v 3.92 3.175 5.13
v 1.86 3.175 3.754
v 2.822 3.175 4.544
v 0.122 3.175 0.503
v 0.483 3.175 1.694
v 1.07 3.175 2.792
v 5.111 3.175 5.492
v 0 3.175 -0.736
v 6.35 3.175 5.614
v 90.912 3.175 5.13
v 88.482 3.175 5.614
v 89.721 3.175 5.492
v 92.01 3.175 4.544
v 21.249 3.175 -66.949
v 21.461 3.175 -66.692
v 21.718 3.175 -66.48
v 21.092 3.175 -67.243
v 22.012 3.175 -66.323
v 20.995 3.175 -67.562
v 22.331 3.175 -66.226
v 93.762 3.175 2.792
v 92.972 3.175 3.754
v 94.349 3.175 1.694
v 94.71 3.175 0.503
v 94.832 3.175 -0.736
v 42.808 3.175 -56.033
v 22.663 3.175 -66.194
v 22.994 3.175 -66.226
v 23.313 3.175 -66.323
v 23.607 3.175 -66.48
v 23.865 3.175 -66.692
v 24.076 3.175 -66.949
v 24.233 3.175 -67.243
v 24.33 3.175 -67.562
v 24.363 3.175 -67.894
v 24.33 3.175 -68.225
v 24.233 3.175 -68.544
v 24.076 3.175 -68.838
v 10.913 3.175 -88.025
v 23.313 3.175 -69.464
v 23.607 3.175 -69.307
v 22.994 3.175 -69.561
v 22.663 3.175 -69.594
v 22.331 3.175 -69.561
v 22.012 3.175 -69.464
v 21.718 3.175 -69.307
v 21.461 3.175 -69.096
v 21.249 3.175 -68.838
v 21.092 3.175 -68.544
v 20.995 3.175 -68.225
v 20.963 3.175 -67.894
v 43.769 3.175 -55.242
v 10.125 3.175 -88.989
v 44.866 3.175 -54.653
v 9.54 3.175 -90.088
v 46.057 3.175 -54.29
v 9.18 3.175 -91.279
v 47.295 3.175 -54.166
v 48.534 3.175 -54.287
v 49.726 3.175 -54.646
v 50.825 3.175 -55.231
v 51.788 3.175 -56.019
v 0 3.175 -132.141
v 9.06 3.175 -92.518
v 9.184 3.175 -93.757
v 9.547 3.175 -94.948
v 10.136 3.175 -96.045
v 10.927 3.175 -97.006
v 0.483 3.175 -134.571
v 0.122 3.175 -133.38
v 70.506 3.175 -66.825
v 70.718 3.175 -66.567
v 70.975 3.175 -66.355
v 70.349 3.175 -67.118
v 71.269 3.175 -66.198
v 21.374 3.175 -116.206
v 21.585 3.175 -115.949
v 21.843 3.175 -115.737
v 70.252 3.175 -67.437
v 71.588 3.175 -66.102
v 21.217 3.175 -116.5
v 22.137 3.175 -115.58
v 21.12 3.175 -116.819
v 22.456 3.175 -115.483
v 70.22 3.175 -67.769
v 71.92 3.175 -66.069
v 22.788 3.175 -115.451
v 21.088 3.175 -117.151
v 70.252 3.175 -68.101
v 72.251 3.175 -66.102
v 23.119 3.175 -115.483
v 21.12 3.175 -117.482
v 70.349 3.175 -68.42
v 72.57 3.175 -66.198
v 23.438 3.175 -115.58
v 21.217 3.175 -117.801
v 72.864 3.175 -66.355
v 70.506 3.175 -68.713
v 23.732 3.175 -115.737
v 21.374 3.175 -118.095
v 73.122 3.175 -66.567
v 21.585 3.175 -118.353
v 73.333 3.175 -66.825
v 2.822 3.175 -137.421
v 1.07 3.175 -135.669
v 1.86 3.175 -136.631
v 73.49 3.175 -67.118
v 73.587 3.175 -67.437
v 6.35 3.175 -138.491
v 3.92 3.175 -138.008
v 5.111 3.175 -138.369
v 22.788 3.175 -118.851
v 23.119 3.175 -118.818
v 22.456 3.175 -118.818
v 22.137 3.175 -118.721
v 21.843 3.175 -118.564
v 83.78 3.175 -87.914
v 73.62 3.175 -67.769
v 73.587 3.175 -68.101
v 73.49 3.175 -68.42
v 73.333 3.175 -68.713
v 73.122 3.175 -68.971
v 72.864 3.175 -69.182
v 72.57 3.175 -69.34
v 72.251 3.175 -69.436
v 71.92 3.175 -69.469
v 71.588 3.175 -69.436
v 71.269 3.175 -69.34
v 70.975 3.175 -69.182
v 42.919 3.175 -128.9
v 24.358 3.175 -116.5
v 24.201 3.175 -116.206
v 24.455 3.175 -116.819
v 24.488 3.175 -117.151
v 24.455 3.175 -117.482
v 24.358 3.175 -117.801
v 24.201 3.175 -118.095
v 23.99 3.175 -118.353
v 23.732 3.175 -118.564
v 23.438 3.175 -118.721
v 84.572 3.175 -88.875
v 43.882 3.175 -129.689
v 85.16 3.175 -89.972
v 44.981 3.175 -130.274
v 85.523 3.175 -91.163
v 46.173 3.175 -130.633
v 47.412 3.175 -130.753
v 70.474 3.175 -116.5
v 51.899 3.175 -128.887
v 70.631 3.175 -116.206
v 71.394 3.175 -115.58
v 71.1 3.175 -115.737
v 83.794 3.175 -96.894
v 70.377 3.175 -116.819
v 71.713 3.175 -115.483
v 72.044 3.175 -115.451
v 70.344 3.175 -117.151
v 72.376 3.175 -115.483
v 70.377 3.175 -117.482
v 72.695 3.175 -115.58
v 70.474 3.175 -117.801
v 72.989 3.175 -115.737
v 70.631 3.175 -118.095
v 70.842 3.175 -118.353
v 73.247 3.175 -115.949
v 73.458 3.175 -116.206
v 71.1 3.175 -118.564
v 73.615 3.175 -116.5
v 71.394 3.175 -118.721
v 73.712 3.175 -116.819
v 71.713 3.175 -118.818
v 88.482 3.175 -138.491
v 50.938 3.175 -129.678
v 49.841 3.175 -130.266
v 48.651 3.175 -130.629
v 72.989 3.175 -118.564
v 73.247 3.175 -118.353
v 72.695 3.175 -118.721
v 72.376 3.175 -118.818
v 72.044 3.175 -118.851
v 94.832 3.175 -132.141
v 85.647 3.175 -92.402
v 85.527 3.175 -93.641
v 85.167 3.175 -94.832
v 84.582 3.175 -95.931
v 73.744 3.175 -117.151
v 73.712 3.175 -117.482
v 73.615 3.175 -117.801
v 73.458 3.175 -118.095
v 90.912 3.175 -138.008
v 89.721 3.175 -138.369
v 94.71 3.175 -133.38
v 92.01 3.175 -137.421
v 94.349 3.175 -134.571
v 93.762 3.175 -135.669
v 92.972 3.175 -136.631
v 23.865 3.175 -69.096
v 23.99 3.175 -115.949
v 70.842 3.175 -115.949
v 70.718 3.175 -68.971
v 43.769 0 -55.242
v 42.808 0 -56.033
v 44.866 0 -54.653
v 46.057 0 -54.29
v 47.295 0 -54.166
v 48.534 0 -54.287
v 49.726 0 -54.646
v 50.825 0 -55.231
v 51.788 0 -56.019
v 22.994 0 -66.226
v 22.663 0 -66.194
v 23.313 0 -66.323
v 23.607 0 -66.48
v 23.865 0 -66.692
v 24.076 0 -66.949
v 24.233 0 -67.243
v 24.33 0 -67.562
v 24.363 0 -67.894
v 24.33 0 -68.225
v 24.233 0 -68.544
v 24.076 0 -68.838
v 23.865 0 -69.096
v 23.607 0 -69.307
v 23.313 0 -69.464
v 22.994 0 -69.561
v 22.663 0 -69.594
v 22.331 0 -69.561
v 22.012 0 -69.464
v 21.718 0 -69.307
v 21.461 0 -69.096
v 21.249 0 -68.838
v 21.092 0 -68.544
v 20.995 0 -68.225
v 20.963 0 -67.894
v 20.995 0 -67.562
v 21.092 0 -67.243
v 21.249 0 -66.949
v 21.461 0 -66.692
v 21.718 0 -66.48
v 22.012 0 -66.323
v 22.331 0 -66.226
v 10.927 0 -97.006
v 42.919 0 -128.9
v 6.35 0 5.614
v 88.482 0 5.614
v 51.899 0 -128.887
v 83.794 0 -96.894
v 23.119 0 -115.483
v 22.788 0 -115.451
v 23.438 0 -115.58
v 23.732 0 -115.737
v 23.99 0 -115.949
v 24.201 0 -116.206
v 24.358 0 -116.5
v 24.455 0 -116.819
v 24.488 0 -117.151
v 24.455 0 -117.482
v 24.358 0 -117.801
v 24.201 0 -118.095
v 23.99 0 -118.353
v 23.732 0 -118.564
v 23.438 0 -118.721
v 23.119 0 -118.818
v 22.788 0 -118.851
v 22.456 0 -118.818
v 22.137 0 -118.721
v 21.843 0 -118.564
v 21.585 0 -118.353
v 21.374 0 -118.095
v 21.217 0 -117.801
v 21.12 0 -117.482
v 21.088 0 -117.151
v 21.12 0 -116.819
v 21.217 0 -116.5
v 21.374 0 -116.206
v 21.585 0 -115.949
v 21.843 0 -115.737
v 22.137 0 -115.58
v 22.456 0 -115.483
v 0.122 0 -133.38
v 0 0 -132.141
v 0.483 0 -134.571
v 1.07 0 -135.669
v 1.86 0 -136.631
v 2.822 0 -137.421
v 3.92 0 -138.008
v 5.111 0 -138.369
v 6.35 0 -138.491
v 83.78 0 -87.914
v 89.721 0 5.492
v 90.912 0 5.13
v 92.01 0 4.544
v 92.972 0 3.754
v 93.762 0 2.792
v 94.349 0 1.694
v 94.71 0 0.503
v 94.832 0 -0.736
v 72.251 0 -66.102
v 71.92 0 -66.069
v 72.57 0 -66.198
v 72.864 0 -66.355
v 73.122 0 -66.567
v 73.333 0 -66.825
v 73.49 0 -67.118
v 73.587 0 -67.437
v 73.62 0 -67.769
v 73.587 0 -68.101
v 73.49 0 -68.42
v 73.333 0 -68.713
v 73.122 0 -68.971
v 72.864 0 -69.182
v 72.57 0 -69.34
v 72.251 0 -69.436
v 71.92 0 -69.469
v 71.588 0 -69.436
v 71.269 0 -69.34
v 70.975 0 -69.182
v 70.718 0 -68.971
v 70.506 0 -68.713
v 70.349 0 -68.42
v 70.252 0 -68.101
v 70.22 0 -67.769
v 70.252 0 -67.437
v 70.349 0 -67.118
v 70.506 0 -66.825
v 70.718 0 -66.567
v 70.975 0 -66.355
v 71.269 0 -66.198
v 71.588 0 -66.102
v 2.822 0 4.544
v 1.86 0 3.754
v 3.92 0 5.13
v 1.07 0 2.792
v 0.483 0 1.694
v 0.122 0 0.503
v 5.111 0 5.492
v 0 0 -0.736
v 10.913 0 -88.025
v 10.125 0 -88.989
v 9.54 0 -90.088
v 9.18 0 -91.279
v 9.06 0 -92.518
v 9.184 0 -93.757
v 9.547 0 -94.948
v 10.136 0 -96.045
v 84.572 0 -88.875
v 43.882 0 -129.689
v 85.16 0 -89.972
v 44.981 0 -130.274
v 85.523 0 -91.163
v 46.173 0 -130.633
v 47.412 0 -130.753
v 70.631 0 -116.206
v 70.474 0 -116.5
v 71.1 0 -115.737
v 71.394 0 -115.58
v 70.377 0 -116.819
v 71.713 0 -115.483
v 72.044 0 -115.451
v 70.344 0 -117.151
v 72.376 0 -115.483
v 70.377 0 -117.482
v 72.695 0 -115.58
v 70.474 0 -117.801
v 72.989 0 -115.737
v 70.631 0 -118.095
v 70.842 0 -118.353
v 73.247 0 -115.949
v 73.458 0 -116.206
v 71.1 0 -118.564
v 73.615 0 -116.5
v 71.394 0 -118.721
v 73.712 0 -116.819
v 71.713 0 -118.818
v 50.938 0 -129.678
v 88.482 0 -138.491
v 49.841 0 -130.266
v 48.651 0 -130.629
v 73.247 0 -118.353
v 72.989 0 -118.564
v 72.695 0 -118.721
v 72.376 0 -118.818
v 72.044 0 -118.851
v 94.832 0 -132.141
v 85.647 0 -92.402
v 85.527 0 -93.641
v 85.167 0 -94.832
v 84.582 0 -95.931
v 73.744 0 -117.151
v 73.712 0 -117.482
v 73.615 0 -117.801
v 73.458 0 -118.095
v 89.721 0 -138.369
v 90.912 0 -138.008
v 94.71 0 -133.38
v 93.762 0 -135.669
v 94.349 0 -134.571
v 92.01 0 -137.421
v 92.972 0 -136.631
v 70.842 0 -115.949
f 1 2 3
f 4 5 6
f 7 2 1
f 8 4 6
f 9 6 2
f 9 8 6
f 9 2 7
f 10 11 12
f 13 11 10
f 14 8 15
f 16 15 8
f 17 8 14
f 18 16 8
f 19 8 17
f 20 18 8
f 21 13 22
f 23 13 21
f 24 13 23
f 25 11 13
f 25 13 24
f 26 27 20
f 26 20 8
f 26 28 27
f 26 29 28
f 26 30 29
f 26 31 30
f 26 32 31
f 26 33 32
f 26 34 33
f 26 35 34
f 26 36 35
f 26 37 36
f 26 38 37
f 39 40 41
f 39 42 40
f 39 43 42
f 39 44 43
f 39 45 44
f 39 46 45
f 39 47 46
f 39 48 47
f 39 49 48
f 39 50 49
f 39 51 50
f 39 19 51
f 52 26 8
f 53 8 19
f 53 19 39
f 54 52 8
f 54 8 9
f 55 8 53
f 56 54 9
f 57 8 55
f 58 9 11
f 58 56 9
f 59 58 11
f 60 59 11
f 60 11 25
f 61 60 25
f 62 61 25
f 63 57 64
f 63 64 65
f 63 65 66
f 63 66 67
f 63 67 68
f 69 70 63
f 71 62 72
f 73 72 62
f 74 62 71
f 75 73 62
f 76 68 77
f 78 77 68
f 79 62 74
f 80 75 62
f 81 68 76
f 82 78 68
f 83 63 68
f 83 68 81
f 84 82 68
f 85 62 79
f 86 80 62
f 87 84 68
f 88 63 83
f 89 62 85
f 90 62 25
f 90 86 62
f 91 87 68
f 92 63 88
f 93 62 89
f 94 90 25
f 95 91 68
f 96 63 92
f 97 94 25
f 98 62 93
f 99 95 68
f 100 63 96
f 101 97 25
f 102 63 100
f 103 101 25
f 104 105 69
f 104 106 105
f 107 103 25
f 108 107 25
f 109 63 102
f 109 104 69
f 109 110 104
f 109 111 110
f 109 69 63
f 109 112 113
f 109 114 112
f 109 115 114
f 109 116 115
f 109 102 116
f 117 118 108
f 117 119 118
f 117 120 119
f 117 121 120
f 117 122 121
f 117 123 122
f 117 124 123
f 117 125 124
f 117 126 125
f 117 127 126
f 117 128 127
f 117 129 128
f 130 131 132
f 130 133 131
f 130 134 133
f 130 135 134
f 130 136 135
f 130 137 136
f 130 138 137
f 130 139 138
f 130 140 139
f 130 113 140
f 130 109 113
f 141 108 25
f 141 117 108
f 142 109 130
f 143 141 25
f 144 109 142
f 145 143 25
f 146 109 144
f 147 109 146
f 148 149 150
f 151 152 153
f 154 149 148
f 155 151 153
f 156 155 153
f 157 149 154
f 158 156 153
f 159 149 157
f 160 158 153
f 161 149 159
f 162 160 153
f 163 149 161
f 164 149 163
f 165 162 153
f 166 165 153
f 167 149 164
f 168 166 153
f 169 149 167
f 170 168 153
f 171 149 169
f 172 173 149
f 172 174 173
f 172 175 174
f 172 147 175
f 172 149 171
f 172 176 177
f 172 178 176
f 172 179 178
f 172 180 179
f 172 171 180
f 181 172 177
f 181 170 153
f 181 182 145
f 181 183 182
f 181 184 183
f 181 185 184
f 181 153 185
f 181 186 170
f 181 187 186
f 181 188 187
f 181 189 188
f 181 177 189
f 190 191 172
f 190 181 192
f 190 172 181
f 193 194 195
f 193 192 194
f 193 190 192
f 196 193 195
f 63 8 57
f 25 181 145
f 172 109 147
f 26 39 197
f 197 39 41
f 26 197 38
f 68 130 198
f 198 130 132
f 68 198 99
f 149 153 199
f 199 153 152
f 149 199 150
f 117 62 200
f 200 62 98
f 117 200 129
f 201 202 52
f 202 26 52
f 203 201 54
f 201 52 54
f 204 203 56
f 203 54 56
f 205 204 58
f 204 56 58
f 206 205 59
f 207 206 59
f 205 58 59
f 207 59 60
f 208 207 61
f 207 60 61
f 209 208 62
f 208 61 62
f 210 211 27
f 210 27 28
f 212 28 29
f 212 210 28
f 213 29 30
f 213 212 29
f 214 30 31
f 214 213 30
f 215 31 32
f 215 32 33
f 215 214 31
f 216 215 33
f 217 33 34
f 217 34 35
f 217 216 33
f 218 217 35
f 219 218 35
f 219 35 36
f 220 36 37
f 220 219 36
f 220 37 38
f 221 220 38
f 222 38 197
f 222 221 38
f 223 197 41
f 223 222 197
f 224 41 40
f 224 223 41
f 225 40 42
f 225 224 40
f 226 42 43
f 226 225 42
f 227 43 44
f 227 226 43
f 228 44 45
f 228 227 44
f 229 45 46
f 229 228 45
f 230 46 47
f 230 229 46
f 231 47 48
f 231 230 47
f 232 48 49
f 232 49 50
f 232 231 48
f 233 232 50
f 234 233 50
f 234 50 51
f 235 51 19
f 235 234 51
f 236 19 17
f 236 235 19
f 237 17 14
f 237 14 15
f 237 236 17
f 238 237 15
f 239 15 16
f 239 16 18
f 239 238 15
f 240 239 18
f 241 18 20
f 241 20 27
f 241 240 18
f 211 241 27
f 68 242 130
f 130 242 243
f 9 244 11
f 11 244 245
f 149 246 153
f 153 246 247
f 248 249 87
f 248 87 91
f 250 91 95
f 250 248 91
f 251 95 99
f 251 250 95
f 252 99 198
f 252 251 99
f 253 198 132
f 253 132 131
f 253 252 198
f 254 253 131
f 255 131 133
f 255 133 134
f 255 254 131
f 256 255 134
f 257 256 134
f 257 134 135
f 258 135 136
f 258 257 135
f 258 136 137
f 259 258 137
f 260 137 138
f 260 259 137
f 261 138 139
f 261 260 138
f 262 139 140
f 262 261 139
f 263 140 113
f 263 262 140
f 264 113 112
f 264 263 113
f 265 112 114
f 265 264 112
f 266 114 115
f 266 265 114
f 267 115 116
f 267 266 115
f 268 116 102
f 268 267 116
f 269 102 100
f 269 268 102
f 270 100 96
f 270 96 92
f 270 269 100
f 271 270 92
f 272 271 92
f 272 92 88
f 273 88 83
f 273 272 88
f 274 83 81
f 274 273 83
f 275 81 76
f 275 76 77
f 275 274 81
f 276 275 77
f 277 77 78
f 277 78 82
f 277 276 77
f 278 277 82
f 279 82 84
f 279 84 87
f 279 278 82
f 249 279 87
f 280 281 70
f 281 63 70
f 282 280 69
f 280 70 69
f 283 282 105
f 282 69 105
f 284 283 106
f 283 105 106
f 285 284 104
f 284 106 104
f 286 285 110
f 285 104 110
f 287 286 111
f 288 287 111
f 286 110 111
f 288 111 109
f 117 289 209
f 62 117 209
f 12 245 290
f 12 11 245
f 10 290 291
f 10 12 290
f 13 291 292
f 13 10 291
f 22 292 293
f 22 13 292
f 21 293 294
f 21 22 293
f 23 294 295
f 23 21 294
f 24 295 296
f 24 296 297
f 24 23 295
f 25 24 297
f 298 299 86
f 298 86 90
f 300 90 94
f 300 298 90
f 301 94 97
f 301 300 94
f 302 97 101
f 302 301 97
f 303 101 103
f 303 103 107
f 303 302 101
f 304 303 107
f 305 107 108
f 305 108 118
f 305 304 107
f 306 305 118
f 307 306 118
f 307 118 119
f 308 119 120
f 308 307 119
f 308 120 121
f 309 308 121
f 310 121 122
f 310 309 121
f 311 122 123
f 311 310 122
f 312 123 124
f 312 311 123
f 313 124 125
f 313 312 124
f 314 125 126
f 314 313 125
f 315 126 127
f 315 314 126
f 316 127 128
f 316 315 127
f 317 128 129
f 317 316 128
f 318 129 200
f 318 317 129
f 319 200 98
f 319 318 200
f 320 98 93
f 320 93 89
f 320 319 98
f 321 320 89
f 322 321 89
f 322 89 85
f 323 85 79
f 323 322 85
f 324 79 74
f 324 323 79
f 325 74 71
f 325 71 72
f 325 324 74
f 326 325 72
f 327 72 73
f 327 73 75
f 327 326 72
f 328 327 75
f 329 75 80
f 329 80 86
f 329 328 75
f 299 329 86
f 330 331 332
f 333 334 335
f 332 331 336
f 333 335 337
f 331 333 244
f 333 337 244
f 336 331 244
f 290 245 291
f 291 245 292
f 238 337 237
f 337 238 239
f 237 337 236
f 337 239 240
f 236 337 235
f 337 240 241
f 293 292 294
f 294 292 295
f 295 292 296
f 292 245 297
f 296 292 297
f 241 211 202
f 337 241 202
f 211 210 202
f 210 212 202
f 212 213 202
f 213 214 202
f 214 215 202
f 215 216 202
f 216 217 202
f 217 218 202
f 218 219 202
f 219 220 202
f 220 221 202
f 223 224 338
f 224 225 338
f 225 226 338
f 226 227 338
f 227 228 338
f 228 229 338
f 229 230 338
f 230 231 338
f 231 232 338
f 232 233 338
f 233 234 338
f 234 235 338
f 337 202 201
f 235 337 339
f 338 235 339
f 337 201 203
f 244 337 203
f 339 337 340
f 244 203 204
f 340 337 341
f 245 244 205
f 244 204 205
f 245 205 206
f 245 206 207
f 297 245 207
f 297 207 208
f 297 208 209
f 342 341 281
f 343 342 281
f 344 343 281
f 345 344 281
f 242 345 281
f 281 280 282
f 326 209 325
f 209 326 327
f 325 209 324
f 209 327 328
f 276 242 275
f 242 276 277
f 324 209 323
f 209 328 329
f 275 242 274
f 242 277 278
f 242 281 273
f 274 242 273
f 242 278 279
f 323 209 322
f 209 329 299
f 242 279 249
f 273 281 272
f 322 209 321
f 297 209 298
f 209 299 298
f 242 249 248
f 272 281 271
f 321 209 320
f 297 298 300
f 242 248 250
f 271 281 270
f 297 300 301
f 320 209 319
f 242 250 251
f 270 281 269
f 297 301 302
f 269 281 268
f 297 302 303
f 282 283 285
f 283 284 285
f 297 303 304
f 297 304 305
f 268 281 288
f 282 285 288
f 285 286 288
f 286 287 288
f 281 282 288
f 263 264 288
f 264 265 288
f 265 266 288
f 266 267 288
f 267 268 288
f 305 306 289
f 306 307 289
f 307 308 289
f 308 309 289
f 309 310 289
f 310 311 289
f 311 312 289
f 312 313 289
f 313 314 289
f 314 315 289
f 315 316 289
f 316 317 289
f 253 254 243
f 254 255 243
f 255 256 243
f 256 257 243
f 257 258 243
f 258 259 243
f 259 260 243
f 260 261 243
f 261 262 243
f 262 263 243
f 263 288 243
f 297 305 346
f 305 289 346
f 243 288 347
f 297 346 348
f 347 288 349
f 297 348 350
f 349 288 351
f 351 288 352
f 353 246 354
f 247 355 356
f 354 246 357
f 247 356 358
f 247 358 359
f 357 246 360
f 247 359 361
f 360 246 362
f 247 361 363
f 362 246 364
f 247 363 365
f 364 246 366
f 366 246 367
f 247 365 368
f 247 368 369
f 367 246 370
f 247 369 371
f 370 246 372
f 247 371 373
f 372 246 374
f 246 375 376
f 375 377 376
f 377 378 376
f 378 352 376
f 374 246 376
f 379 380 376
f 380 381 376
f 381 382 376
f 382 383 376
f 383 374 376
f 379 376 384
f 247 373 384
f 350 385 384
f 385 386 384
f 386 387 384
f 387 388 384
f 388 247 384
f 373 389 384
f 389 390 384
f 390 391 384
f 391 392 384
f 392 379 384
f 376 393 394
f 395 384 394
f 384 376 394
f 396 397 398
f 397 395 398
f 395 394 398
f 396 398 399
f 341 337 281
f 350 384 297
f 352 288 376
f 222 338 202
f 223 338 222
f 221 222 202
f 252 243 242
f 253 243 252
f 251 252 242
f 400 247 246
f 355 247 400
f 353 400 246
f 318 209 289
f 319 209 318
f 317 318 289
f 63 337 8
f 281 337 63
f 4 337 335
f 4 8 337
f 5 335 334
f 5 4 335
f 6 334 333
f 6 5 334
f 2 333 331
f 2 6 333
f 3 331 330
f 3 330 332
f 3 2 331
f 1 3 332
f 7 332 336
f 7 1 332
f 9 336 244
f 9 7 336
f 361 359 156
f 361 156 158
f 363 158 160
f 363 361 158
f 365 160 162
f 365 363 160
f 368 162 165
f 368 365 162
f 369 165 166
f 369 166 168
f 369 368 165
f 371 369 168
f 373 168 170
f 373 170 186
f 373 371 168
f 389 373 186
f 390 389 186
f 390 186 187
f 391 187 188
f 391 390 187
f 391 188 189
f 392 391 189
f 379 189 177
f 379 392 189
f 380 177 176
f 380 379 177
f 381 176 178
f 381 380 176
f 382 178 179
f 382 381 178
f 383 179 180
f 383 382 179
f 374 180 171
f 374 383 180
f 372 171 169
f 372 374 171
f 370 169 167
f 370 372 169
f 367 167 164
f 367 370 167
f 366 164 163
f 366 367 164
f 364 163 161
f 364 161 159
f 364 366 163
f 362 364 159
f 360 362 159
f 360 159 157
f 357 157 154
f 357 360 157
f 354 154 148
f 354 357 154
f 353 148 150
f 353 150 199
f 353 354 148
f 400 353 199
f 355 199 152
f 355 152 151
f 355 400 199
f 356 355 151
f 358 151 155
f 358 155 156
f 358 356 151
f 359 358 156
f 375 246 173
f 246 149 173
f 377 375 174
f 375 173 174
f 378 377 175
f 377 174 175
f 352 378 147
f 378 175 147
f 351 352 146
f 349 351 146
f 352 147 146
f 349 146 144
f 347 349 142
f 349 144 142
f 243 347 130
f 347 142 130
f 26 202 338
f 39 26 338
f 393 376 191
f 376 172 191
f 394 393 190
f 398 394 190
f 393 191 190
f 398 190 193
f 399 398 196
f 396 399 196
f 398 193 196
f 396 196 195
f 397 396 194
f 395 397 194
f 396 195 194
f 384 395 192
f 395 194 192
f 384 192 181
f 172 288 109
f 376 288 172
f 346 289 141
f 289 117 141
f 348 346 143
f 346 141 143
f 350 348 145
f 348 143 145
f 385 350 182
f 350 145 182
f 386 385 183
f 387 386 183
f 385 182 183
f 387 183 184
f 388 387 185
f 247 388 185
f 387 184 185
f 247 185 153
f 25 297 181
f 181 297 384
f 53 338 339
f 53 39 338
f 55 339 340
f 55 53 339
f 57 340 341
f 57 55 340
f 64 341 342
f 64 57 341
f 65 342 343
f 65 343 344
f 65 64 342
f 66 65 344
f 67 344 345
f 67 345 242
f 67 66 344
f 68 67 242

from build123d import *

# Parameters (mm, degrees)
SKETCH1_W           = 94.832
SKETCH1_H           = 144.105
SKETCH1_R           = 1.7
BOSS_EXTRUDE2_DEPTH = 3.175
FILLET1_R           = 6.35
FILLET2_R           = 6.35


with BuildPart() as part:
    # Sketch1 → Boss-Extrude2 (new body)
    with BuildSketch(Plane(origin=(0, 0, 0), x_dir=(1, 0, 0), z_dir=(0, 1, 0))):
        with Locations((47.416, 66.438639868)):
            Rectangle(SKETCH1_W, SKETCH1_H)
        with Locations(Location((22.7875, 117.150797893, 0), (0, 0, 270))):
            Circle(SKETCH1_R, mode=Mode.SUBTRACT)
        with Locations(Location((72.0445, 117.150797893, 0), (0, 0, 270))):
            Circle(SKETCH1_R, mode=Mode.SUBTRACT)
        with Locations(Location((71.919698828, 67.768996721, 0), (0, 0, 270))):
            Circle(SKETCH1_R, mode=Mode.SUBTRACT)
        with Locations(Location((22.662698828, 67.893797893, 0), (0, 0, 270))):
            Circle(SKETCH1_R, mode=Mode.SUBTRACT)
        Polygon((6.429841975, 92.522297893), (47.416, 133.383654746), (88.277356853, 92.397496721), (47.291198828, 51.536139868), align=None, mode=Mode.SUBTRACT)
    extrude(amount=BOSS_EXTRUDE2_DEPTH)

    # Fillet1
    fillet1_edges = [part.edges().sort_by_distance(p)[0] for p in [
        (47.416, 1.5875, -133.383654746),
        (6.429841975, 1.5875, -92.522297893),
        (47.291198828, 1.5875, -51.536139868),
        (88.277356853, 1.5875, -92.397496721),
    ]]
    fillet(fillet1_edges, radius=FILLET1_R)

    # Fillet2
    fillet2_edges = [part.edges().sort_by_distance(p)[0] for p in [
        (94.832, 1.5875, 5.613860132),
        (0, 1.5875, 5.613860132),
        (0, 1.5875, -138.491139868),
        (94.832, 1.5875, -138.491139868),
    ]]
    fillet(fillet2_edges, radius=FILLET2_R)


solid = part.part
